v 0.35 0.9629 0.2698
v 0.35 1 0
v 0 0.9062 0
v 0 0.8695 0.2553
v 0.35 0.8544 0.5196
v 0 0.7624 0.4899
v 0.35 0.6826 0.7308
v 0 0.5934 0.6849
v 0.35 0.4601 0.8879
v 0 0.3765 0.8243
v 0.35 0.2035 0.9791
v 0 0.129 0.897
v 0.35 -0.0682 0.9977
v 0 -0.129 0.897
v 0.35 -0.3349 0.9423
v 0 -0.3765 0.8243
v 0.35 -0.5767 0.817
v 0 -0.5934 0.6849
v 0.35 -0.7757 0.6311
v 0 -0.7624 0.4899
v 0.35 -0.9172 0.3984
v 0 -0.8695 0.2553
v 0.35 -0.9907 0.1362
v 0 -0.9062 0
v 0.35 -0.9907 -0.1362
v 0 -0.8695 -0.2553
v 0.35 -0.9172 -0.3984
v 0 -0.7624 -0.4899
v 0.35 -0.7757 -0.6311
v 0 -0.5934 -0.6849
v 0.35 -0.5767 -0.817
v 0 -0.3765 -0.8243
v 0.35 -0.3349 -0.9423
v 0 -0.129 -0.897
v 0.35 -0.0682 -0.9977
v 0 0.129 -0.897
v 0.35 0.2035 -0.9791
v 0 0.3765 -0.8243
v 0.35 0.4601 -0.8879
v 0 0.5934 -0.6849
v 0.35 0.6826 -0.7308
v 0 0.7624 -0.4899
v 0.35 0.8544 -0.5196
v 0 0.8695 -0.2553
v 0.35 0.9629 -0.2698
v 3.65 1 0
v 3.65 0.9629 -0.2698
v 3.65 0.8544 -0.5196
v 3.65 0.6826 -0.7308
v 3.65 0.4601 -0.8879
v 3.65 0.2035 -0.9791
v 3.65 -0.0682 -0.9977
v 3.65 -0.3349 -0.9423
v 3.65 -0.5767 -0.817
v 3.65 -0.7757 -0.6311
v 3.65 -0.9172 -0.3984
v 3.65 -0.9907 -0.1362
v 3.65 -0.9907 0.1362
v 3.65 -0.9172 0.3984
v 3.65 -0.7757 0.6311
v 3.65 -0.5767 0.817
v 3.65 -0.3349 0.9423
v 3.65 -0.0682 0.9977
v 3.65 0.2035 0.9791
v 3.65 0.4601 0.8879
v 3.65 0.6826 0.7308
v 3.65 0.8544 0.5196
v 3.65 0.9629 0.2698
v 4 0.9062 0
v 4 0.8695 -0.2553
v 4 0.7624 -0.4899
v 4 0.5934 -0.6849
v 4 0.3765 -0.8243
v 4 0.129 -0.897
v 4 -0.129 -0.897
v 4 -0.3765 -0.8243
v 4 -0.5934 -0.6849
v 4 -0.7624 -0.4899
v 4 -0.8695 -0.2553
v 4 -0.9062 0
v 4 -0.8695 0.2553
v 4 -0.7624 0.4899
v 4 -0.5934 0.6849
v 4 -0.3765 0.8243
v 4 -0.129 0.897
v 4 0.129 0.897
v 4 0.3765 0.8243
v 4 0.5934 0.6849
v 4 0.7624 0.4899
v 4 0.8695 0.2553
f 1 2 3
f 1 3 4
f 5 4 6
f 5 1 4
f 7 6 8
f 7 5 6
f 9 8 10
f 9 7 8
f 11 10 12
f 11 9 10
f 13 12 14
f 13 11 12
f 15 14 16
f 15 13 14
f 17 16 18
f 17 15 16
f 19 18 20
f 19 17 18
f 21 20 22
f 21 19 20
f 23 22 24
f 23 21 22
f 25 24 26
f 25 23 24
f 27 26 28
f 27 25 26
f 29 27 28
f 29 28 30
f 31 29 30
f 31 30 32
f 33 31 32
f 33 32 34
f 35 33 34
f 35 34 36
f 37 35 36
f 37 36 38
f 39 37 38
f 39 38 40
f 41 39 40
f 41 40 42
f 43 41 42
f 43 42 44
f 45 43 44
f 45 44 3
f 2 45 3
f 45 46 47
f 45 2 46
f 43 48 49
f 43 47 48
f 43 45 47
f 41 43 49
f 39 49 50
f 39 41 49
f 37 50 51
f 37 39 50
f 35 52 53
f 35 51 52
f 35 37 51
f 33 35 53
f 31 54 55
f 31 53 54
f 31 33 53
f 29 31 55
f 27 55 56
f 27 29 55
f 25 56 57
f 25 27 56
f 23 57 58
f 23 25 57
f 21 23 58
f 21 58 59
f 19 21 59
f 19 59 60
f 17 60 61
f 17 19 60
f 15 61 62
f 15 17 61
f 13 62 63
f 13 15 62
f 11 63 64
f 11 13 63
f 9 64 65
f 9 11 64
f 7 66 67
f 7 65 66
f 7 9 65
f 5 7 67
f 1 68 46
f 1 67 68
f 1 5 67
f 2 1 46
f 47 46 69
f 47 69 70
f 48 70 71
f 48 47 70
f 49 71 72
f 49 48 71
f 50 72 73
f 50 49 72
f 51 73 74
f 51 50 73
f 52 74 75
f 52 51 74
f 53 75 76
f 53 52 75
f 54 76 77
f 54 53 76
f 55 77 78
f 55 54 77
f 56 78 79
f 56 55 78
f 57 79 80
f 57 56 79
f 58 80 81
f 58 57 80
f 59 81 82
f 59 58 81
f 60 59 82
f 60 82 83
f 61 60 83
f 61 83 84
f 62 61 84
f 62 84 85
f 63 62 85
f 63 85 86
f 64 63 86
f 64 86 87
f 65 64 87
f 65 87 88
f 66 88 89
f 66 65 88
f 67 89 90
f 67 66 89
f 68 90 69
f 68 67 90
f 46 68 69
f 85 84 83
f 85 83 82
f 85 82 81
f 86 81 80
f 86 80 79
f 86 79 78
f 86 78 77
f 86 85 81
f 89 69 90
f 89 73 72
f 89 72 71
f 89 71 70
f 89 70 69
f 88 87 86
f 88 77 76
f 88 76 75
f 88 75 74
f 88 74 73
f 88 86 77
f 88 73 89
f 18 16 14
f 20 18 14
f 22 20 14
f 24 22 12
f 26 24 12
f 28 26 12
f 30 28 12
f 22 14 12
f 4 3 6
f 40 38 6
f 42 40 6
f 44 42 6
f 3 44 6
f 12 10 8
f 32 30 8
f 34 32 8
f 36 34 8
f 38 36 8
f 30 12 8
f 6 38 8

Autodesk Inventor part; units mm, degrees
ref_plane "YZ Plane" through (0, 0, 0) normal (1, 0, 0) x (0, 1, 0)
ref_plane "XZ Plane" through (0, 0, 0) normal (0, 1, 0) x (-1, 0, 0)
ref_plane "XY Plane" through (0, 0, 0) normal (0, 0, 1) x (1, 0, 0)
sketch "Skizze" plane through (0, 0, 0) normal (1, 0, 0) x (0, 1, 0)
  circle A0 centre (0, 0) radius 1
  dimension "d1" = 2
extrude "Körper" add sketch "Skizze" along normal blind 4
chamfer "Fase1" distance 0.35 angle 15 1 edges at (0, -1, 0) measured on face at (2.6667, 0.9968, -0.0805)
chamfer "Fase2" distance 0.35 angle 15 1 edges at (4, -1, 0) measured on face at (2.7833, 0.9968, -0.0805)
equation "\"d1\" = NND"
equation "\"d4\" = PHH"
equation "\"d5\" = FAWI"
equation "\"d11\" = PHH"
equation "\"d8\" = PHH"
equation "\"d9\" = FAWI"
equation "\"d12\" = PHH"
equation "\"NND\" = 2"
equation "\"NLG\" = 6"
equation "\"PHH\" = 0.35"
equation "\"FAWI\" = 15deg"
equation "\"KAH\" = 0"
properties part number "ISO 2338 - 2 m6 x 6" material "Edelstahl, austenitisch"
